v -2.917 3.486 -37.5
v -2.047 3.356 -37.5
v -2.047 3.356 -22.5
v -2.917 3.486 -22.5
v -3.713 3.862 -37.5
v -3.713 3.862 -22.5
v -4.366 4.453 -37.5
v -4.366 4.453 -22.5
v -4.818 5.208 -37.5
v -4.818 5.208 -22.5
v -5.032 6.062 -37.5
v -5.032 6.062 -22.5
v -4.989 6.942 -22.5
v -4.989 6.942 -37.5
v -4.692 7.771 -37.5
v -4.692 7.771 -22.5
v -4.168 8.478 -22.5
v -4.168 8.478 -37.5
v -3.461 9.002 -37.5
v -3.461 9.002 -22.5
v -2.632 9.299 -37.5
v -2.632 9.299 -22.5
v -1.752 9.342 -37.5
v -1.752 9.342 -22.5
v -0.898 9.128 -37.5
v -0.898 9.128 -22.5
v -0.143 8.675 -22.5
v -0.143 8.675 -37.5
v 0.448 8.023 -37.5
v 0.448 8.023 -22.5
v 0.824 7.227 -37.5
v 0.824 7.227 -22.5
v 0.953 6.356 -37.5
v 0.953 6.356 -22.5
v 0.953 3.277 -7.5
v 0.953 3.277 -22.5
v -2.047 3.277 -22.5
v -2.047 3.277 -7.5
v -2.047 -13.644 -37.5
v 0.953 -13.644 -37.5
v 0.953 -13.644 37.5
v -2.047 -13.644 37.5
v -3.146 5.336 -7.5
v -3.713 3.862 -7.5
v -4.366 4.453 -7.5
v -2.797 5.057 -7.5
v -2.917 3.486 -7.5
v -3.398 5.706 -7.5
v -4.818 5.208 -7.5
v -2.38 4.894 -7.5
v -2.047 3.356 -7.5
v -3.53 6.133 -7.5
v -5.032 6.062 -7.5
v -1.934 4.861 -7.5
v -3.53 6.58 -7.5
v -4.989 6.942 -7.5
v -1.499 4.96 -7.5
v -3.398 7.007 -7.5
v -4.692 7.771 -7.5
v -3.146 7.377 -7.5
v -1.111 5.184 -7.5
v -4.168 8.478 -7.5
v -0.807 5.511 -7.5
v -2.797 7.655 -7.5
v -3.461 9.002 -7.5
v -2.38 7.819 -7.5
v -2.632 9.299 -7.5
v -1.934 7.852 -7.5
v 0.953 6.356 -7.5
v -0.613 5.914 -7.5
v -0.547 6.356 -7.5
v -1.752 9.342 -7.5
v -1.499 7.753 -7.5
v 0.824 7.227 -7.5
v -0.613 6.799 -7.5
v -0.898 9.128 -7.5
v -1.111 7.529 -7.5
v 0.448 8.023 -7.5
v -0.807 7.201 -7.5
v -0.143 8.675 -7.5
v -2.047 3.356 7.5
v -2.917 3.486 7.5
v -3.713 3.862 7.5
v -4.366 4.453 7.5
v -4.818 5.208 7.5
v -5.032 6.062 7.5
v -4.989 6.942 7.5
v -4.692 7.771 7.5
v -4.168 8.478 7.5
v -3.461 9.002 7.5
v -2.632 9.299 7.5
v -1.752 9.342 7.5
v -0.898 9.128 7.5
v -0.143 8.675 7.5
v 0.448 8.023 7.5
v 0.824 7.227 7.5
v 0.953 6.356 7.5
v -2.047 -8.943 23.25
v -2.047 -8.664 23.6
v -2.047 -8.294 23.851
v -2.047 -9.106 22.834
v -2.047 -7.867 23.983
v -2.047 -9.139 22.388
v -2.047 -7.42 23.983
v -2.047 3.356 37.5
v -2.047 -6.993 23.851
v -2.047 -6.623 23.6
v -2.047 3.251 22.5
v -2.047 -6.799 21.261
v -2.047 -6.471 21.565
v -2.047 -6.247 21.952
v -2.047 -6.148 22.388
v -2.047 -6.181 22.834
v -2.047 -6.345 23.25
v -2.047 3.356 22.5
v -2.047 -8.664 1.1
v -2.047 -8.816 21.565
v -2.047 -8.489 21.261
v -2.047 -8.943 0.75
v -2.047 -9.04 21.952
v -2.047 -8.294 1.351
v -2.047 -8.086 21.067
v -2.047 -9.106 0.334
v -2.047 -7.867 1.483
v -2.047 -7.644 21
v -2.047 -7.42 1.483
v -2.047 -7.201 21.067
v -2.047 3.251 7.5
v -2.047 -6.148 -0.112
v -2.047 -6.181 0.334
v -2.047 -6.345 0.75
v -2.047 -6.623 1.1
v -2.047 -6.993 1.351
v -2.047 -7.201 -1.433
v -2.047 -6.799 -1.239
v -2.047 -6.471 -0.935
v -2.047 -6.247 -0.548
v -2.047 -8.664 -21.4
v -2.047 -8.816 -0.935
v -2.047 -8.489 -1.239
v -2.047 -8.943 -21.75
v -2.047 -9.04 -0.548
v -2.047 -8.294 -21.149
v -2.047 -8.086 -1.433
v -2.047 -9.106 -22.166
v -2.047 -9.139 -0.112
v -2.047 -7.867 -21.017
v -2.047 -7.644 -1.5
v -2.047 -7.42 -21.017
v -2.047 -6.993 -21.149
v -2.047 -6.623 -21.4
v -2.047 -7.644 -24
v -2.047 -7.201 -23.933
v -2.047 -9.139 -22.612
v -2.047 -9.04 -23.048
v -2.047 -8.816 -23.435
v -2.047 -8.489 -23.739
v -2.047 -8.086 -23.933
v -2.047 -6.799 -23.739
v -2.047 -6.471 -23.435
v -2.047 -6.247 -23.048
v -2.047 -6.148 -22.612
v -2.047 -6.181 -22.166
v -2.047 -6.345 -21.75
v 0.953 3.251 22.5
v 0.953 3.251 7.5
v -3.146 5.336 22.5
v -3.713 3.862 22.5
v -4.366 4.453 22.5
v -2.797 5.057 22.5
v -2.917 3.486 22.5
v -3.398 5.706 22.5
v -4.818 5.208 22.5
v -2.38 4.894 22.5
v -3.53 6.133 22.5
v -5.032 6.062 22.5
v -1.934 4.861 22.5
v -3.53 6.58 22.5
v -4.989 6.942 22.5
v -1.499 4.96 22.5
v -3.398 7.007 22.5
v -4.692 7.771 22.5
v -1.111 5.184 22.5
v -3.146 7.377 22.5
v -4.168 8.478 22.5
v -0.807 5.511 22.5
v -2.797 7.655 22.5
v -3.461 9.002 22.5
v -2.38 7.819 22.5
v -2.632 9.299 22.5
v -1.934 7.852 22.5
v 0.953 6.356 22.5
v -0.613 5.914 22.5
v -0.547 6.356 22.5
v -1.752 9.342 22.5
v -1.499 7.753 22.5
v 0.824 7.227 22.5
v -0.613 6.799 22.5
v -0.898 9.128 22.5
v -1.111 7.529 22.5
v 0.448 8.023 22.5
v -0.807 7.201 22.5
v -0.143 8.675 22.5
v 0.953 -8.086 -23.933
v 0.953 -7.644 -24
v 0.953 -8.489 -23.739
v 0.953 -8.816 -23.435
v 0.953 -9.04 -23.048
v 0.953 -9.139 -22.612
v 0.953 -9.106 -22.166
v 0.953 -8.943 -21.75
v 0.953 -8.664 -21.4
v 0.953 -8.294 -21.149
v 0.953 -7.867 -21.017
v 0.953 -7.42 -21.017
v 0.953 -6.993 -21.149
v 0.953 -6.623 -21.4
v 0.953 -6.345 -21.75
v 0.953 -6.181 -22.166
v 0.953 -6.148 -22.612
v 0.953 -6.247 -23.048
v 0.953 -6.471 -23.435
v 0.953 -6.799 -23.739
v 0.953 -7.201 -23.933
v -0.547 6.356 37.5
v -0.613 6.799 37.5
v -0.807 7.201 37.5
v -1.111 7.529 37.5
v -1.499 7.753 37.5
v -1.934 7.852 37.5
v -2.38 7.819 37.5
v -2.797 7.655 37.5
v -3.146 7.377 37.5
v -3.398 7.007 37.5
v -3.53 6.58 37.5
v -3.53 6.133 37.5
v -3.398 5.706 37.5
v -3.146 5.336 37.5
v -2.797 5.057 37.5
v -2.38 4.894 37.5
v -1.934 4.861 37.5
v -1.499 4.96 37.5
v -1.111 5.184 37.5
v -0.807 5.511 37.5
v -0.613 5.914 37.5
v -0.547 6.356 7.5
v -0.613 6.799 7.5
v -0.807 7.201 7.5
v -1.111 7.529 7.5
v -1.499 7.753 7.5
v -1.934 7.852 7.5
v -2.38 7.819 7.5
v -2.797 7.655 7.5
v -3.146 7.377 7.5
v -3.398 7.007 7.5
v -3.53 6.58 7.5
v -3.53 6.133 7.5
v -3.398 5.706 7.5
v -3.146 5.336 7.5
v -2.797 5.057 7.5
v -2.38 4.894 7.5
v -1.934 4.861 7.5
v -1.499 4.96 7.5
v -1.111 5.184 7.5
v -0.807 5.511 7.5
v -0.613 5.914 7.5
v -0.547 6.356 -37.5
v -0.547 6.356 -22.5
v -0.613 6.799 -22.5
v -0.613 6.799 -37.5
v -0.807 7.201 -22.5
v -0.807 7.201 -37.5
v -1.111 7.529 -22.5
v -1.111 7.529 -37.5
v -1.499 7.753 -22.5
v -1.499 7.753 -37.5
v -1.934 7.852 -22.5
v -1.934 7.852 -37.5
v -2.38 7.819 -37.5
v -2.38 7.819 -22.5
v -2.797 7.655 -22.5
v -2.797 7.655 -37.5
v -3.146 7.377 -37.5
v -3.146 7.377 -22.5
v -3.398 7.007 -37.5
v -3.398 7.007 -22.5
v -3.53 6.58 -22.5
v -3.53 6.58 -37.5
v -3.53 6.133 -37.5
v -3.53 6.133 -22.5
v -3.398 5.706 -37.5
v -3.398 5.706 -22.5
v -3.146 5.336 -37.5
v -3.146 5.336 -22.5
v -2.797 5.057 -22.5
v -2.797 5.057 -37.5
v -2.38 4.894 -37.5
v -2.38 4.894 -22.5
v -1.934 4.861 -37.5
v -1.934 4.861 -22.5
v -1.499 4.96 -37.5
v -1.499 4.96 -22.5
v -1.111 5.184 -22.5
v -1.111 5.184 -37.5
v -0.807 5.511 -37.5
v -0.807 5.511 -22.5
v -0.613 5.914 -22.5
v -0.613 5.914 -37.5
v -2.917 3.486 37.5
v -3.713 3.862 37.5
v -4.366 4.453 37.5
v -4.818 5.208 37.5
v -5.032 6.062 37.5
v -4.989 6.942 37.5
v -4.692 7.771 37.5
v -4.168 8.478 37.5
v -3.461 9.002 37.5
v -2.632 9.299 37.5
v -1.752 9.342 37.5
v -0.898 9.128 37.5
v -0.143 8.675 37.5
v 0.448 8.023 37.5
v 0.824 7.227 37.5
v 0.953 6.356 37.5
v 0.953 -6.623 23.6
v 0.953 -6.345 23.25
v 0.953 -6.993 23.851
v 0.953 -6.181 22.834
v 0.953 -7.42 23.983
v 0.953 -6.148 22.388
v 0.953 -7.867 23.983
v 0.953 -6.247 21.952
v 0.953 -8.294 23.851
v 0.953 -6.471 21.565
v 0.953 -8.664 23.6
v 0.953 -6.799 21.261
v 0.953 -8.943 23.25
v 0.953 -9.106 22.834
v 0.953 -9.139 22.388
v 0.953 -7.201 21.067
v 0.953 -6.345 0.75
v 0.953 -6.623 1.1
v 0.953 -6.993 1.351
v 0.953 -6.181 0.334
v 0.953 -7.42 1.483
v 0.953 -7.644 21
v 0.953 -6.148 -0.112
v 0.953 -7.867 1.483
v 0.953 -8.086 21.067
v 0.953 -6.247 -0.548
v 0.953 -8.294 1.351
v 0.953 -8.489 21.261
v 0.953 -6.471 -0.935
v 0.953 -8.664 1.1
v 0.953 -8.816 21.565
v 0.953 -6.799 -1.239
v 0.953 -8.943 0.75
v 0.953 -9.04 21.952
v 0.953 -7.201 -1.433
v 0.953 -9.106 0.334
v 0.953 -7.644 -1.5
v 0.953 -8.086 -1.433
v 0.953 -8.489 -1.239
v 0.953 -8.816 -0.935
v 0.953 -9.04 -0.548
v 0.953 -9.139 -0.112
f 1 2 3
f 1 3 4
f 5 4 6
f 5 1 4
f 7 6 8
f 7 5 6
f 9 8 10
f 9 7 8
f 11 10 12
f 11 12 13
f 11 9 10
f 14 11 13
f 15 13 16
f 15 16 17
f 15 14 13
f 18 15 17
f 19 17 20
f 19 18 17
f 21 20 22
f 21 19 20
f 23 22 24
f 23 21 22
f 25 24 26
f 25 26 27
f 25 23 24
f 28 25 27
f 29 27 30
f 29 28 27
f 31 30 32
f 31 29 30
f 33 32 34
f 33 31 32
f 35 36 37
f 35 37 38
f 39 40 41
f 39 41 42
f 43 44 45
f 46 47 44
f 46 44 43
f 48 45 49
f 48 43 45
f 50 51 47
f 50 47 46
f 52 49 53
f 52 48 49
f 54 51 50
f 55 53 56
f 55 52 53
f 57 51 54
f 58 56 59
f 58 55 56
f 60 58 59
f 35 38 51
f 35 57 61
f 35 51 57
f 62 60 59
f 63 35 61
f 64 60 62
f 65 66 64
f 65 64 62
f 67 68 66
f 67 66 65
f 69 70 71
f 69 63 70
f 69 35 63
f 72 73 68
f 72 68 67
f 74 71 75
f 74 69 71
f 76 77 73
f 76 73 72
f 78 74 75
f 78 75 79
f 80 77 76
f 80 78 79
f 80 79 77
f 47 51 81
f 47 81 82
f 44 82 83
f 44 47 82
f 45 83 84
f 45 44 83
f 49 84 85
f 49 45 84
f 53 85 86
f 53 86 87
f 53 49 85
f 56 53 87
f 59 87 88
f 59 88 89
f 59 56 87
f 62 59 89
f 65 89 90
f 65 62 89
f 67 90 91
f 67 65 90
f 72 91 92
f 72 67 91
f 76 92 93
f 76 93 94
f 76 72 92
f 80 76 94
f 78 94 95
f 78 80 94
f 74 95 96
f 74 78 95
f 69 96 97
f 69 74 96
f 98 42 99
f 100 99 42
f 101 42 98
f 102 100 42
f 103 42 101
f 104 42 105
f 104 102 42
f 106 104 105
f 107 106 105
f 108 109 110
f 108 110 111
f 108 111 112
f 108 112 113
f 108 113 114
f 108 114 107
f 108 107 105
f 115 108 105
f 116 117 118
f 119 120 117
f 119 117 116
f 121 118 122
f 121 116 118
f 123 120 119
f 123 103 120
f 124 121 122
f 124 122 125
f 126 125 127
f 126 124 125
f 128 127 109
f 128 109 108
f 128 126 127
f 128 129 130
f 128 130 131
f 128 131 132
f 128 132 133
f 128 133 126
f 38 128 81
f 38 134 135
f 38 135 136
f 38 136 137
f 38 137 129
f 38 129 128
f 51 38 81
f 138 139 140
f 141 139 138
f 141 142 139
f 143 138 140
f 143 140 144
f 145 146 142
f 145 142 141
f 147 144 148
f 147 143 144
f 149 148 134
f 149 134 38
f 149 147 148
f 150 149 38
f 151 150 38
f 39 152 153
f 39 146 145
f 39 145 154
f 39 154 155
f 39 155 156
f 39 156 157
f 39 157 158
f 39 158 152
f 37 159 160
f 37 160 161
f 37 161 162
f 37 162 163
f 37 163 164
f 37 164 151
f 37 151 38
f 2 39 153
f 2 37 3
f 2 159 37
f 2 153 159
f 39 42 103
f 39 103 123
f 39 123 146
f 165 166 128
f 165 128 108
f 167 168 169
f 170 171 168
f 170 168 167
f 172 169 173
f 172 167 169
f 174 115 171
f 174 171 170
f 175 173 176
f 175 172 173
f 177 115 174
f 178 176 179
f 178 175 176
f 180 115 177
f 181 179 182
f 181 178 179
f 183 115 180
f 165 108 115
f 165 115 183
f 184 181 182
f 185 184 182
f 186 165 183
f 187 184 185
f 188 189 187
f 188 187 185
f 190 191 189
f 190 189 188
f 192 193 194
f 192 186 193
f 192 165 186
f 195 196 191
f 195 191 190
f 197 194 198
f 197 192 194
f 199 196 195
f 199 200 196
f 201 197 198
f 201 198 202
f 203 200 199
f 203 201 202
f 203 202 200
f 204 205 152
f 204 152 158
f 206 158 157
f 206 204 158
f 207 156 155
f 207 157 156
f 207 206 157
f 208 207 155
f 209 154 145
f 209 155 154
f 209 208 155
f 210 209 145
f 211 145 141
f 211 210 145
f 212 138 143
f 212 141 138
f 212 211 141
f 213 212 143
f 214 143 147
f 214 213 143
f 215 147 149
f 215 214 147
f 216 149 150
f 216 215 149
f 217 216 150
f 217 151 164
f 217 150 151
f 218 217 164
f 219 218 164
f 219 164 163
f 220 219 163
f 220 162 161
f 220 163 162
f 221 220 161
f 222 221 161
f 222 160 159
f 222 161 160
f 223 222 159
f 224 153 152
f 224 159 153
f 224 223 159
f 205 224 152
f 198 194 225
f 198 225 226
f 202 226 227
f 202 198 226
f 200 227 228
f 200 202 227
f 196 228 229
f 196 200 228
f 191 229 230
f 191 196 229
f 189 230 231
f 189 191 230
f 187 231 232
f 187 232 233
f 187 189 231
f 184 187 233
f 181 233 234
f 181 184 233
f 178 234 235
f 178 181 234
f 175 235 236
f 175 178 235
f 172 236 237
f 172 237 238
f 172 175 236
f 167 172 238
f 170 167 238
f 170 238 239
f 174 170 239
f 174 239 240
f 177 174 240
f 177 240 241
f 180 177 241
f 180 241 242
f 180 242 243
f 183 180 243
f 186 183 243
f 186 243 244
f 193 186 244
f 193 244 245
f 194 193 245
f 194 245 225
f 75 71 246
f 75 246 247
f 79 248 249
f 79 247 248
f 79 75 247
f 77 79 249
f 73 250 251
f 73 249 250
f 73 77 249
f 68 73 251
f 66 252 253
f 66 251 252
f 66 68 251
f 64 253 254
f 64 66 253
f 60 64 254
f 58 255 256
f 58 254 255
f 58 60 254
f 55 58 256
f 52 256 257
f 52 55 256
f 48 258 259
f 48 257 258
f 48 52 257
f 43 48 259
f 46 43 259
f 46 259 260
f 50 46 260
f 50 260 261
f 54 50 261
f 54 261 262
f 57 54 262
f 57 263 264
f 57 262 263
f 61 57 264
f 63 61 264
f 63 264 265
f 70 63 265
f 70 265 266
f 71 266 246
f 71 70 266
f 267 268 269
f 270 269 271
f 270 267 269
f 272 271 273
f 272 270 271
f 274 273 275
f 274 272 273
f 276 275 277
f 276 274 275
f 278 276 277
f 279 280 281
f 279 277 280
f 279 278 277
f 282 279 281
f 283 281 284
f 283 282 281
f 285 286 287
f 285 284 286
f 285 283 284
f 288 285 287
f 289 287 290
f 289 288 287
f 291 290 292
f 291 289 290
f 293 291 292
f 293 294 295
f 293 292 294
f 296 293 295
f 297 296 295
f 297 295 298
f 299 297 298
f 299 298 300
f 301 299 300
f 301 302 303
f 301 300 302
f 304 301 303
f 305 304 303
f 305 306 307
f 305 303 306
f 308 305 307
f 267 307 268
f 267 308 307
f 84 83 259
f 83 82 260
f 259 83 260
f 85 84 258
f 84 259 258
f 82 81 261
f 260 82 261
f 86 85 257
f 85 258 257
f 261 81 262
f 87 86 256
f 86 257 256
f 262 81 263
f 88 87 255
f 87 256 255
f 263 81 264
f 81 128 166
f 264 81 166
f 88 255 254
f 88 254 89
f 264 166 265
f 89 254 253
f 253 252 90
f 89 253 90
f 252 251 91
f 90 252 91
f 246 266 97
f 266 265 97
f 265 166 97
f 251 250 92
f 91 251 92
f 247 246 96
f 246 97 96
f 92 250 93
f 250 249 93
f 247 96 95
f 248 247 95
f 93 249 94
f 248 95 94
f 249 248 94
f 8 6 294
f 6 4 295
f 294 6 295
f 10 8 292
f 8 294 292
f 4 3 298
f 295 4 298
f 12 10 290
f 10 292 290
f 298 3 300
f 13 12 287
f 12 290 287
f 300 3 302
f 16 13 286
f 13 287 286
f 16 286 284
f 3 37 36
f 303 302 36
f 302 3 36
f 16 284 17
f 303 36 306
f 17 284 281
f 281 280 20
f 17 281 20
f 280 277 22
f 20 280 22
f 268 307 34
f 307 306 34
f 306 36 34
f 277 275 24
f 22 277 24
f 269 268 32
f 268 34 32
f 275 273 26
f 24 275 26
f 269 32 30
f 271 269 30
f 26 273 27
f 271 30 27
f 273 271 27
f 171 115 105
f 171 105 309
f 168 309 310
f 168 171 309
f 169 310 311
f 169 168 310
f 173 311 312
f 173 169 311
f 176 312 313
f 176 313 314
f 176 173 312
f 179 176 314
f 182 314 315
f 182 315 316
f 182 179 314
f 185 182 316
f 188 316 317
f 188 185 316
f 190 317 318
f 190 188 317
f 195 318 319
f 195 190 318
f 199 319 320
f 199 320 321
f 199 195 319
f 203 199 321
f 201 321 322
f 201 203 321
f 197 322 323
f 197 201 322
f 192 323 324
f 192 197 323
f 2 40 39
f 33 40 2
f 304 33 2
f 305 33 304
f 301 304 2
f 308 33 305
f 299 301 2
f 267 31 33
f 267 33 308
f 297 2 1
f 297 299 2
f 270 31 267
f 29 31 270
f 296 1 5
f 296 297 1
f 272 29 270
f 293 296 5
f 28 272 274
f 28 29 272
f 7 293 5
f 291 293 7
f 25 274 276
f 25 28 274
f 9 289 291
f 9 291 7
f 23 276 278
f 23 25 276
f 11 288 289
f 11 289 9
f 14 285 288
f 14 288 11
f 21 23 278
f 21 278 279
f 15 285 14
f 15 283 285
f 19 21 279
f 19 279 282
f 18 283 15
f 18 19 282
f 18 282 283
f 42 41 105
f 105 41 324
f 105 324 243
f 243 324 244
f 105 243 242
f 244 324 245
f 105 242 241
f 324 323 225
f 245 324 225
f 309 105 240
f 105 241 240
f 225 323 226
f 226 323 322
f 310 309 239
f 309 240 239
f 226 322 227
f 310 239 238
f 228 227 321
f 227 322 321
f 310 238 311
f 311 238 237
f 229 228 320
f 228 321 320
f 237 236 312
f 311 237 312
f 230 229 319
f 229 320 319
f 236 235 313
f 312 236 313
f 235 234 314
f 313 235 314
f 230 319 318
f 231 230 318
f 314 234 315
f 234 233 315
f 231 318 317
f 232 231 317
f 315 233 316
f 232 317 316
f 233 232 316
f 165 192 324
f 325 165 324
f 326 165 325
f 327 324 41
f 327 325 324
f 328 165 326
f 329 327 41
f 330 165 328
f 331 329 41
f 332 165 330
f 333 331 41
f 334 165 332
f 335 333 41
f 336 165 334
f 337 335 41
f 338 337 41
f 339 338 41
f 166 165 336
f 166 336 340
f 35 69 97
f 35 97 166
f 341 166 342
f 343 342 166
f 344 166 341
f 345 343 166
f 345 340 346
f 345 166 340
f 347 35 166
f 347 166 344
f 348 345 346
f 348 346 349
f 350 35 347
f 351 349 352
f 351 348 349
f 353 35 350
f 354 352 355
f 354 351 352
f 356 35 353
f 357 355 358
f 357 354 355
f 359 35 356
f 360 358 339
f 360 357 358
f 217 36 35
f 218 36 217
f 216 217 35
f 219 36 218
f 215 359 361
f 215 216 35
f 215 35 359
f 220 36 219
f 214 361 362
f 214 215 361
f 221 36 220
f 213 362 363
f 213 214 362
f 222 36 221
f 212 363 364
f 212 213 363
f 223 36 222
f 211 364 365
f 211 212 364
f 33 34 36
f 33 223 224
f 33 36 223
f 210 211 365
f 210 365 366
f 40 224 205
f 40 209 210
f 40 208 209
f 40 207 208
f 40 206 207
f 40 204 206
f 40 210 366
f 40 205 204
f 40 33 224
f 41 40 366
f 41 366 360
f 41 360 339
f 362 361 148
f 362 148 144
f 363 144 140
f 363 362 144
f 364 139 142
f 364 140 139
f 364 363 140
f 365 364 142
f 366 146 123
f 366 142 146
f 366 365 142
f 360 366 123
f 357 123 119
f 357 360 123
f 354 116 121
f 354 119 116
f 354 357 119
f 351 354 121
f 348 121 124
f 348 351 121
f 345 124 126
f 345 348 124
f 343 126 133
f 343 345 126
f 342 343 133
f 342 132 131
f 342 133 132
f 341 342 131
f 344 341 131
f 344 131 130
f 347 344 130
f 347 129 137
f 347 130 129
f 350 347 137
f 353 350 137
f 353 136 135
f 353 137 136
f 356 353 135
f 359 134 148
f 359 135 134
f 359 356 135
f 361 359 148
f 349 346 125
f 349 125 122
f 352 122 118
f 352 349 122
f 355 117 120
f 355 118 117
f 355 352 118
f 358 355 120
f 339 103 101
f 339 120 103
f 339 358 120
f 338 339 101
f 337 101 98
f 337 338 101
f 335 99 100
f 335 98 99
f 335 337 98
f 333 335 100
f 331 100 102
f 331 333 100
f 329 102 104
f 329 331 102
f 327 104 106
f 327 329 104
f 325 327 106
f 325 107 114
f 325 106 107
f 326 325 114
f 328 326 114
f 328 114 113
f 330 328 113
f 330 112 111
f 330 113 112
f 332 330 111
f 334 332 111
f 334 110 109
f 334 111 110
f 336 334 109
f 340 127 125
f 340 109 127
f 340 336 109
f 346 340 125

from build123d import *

# Parameters (mm, degrees)
BOSS_EXTRUDE1_DEPTH      = 37.5
BOSS_EXTRUDE1_DEPTH_BACK = 37.5
SKETCH2_R                = 1.5
CUT_EXTRUDE3_DEPTH       = 10
CUT_EXTRUDE3_DEPTH_BACK  = 10
SKETCH4_R                = 1.5
SKETCH4_W                = 15
SKETCH4_H                = 10


with BuildPart() as part:
    # Sketch2 → Boss-Extrude1 (new, two sides: drawn at the far end of the back side and taken through both)
    with BuildSketch(Plane.XY.offset(-BOSS_EXTRUDE1_DEPTH_BACK)):
        with BuildLine():
            Line((-2.046544696, -13.643631305), (-2.046544696, 3.356368695))
            ThreePointArc((-2.046544696, 3.356368695), (-4.167865039, 8.477689038), (0.953455304, 6.356368695))
            Line((0.953455304, 6.356368695), (0.953455304, -13.643631305))
            Line((0.953455304, -13.643631305), (-2.046544696, -13.643631305))
        make_face()
        with Locations((-2.046544696, 6.356368695)):
            Circle(SKETCH2_R, mode=Mode.SUBTRACT)
    extrude(amount=BOSS_EXTRUDE1_DEPTH + BOSS_EXTRUDE1_DEPTH_BACK)

    # Sketch4 → Cut-Extrude3 (cut, two sides: drawn at the far end of the back side and taken through both)
    with BuildSketch(Plane.ZY.offset(2.046544696).offset(-CUT_EXTRUDE3_DEPTH_BACK)):
        with Locations((-22.5, -7.643631305)):
            Circle(SKETCH4_R)
        with Locations((0, -7.643631305)):
            Circle(SKETCH4_R)
        with Locations((22.5, -7.643631305)):
            Circle(SKETCH4_R)
        with Locations((-15, 8.277390495)):
            Rectangle(SKETCH4_W, SKETCH4_H)
        with Locations((15, 8.251)):
            Rectangle(SKETCH4_W, SKETCH4_H)
    extrude(amount=CUT_EXTRUDE3_DEPTH + CUT_EXTRUDE3_DEPTH_BACK, mode=Mode.SUBTRACT)


solid = part.part
